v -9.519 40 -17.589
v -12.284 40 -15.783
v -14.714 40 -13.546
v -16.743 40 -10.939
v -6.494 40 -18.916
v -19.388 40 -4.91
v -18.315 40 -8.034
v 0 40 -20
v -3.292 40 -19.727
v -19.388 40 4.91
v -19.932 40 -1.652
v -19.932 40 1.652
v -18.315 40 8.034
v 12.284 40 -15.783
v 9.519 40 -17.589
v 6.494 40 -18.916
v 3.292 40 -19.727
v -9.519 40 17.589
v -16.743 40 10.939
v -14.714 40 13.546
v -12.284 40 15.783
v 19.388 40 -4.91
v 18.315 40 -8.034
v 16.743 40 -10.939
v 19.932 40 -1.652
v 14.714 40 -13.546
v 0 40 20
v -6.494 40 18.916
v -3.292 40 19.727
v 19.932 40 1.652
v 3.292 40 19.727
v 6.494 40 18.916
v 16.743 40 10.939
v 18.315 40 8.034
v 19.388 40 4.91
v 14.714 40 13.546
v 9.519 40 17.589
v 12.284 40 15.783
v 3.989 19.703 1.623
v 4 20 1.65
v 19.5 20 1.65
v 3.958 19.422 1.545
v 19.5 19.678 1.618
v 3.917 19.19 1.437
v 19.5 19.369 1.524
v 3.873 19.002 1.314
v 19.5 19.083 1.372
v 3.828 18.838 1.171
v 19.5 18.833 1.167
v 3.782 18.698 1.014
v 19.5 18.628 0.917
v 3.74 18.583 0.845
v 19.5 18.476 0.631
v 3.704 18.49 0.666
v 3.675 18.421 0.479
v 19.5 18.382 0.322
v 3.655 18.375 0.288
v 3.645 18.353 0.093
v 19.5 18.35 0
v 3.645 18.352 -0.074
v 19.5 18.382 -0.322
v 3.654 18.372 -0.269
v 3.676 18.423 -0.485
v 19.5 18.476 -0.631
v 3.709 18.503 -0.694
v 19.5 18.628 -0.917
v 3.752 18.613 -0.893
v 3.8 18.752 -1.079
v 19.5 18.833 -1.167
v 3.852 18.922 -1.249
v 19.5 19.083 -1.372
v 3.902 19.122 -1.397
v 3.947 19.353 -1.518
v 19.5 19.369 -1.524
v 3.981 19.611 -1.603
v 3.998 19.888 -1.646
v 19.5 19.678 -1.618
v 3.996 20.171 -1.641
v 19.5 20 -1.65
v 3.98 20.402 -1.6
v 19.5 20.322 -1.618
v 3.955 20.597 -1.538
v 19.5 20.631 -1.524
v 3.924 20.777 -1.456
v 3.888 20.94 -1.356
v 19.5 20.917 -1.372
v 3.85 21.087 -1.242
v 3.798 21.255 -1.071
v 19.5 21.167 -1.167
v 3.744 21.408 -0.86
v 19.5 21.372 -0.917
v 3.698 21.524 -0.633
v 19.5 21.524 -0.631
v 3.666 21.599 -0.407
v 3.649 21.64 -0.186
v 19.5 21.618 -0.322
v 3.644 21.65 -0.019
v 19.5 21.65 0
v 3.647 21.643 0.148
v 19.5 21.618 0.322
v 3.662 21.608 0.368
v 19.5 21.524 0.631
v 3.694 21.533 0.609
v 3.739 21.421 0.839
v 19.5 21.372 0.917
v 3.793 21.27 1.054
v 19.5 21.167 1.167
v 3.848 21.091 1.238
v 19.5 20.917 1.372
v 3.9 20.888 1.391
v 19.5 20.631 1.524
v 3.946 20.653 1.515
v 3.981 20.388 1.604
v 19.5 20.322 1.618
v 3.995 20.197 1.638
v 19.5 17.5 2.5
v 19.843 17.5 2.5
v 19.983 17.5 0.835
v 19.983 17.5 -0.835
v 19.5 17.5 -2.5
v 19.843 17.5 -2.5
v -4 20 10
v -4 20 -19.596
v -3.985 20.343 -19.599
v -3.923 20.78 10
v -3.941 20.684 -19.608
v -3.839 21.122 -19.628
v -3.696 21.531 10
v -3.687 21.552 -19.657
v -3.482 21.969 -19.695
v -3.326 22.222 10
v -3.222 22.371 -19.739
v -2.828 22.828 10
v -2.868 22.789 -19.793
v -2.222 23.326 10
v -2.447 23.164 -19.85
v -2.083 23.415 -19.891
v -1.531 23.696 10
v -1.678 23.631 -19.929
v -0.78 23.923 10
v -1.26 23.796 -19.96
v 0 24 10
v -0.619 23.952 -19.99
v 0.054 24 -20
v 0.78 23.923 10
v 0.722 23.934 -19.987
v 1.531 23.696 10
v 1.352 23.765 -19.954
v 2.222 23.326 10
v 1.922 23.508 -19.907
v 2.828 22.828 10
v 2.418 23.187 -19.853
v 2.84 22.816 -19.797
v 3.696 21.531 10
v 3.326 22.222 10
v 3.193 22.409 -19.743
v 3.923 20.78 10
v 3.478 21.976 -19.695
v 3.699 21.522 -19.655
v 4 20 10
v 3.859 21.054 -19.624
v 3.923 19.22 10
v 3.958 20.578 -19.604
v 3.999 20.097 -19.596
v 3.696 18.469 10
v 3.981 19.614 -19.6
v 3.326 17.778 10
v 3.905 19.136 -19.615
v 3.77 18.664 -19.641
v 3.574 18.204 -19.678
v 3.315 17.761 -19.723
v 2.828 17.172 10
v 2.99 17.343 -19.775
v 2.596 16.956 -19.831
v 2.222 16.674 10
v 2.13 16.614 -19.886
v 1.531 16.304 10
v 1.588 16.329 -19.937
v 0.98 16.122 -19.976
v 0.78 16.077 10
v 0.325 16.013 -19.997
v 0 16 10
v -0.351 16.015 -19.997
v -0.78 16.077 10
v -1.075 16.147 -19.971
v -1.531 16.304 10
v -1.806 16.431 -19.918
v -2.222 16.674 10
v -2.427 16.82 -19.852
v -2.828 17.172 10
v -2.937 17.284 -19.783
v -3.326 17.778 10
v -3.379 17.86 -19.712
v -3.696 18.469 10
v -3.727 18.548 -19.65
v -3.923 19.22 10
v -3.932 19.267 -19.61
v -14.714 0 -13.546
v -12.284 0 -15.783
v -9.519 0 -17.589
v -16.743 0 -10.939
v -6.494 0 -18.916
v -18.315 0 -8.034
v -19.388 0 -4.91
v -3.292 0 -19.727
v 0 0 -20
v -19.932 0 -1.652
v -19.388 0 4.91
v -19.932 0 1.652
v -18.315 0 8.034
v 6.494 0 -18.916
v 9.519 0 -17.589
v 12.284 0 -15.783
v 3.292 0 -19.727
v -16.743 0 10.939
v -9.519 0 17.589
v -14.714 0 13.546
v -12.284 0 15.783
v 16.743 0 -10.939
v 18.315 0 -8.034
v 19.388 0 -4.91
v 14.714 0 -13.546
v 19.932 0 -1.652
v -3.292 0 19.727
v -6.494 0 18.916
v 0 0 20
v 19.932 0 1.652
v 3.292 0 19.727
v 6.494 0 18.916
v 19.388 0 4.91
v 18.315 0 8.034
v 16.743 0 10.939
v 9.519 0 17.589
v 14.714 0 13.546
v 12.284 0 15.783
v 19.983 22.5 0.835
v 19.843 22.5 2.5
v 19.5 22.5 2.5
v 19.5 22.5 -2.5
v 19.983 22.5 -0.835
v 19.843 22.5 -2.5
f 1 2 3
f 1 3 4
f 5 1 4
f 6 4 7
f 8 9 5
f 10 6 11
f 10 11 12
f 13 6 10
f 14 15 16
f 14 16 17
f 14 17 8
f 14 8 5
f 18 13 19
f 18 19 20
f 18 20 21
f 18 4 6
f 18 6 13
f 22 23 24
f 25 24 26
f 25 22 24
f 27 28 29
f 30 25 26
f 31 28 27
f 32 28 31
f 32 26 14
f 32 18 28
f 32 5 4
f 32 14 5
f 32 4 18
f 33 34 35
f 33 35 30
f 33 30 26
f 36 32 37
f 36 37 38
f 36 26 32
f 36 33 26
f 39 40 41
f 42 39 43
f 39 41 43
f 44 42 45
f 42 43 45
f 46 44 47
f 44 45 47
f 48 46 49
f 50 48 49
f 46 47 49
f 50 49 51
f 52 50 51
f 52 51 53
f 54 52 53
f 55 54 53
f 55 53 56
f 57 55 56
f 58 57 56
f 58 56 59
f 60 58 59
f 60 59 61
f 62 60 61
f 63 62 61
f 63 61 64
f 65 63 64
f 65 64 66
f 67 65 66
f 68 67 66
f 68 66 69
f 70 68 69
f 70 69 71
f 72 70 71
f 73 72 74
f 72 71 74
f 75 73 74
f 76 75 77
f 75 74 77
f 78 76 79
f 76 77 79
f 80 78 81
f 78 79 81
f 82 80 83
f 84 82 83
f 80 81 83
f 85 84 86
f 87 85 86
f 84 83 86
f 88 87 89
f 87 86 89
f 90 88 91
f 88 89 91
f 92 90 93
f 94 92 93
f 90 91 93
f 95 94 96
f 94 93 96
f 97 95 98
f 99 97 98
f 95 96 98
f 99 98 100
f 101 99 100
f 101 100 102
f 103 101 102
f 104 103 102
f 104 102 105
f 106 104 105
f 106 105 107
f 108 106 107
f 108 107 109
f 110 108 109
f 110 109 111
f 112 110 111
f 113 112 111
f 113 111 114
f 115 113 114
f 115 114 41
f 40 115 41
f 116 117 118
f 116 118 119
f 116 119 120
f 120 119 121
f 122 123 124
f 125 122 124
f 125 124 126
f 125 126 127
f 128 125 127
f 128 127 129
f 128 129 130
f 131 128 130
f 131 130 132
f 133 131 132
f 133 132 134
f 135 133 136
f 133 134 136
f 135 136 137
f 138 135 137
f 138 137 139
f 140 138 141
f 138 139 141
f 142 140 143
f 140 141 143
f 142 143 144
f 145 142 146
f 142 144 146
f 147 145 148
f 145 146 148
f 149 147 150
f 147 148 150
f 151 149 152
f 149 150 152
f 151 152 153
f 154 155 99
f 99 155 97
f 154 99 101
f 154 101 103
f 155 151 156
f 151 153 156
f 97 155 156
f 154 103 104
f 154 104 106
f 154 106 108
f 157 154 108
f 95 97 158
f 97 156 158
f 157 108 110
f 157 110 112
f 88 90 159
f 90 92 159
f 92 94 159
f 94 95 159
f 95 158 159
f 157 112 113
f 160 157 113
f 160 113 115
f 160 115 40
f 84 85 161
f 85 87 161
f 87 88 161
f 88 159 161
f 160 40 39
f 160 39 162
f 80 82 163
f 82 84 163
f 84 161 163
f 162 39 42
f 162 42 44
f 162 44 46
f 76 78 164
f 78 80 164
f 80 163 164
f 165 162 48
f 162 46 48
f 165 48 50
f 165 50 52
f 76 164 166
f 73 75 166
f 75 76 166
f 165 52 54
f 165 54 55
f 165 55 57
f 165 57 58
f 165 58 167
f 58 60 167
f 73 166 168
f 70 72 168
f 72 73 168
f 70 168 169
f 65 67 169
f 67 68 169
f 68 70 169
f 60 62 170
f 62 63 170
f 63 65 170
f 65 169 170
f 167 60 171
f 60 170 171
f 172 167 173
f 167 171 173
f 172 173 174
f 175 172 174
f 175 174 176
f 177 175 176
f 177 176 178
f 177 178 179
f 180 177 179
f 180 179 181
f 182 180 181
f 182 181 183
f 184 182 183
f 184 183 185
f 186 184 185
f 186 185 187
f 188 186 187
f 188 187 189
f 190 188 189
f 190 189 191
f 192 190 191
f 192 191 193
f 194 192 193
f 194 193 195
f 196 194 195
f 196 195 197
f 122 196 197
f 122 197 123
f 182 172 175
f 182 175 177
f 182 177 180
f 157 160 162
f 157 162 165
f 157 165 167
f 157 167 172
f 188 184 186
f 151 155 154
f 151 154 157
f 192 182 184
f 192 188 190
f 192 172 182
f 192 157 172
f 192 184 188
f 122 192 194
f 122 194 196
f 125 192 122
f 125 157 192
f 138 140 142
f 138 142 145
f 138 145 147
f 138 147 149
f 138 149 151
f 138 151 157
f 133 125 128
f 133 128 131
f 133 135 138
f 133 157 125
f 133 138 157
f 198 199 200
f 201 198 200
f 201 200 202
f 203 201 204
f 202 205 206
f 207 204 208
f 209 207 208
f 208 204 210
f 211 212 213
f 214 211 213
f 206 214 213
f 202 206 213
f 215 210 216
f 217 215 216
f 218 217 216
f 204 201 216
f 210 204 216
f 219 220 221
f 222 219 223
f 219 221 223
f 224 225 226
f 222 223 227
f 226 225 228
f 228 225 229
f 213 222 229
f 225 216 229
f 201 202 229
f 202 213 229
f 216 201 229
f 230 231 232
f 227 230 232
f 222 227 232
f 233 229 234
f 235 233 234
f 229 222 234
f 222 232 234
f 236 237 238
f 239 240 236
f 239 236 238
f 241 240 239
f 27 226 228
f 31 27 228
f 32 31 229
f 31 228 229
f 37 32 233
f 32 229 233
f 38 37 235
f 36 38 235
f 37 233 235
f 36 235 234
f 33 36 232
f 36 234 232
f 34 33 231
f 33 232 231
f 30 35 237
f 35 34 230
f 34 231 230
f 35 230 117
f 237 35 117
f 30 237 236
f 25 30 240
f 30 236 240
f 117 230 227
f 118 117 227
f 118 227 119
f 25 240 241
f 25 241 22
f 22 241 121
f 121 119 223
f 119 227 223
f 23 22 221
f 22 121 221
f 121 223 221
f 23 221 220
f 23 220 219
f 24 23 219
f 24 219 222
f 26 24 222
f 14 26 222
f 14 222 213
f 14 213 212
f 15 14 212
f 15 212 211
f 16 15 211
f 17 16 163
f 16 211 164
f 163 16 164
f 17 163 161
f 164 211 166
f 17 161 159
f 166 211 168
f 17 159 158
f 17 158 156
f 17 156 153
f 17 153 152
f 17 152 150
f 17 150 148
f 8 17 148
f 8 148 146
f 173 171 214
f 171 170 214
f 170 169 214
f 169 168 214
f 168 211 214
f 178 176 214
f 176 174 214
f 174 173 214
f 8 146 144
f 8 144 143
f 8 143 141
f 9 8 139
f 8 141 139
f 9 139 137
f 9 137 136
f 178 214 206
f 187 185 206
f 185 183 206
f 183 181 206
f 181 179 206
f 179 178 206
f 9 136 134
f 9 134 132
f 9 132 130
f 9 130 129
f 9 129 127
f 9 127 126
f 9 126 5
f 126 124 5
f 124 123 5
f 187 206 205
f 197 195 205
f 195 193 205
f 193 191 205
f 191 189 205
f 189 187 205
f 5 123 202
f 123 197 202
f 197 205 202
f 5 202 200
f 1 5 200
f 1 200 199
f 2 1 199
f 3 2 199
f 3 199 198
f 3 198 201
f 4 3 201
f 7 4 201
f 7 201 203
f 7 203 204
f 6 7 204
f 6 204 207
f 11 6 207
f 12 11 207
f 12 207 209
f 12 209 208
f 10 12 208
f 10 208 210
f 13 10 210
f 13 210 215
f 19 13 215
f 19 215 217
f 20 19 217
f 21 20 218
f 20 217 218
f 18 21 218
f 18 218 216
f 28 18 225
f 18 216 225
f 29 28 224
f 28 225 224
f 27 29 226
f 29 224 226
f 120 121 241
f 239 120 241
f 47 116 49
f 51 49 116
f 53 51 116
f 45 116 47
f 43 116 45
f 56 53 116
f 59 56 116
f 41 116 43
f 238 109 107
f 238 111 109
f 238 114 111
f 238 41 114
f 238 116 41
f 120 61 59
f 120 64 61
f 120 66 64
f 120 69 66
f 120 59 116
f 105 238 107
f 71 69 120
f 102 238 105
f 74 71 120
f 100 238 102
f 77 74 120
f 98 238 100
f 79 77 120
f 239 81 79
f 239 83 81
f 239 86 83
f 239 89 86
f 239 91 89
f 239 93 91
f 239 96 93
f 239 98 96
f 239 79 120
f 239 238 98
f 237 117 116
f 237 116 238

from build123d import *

# Parameters (mm, degrees)
SKETCH1_R                  = 20
BOSS_EXTRUDE1_DEPTH        = 40
SKETCH3_R                  = 4
CUT_EXTRUDE1_DEPTH         = 30
M4X0_7_TAPPED_HOLE1_REACH  = 50.99
M4X0_7_TAPPED_HOLE1_BORE_R = 1.65
SKETCH4_W                  = 5
SKETCH4_H                  = 5
CUT_EXTRUDE2_DEPTH         = 0.5


with BuildPart() as part:
    # Sketch1 → Boss-Extrude1 (new body)
    with BuildSketch(Plane(origin=(0, 0, 0), x_dir=(1, 0, 0), z_dir=(0, 1, 0))):
        with Locations(Location((0, 0, 0), (0, 0, 270))):
            Circle(SKETCH1_R)
    extrude(amount=BOSS_EXTRUDE1_DEPTH)

    # Sketch3 → Cut-Extrude1 (cut)
    with BuildSketch(Plane(origin=(0, 0, -20), x_dir=(-1, 0, 0), z_dir=(0, 0, -1))):
        with Locations((0, 20)):
            Circle(SKETCH3_R)
    extrude(amount=-CUT_EXTRUDE1_DEPTH, mode=Mode.SUBTRACT)

    # M4x0.7 Tapped Hole1 bore (on position points) → M4x0.7 Tapped Hole1 (cut, up to next)
    with BuildSketch(Plane(origin=(20, 20, 0), x_dir=(0, 0, 1), z_dir=(1, 0, 0)), mode=Mode.PRIVATE) as m4x0_7_tapped_hole1_sk1:
        Circle(M4X0_7_TAPPED_HOLE1_BORE_R)
    m4x0_7_tapped_hole1_tool1 = extrude(m4x0_7_tapped_hole1_sk1.sketch, amount=-M4X0_7_TAPPED_HOLE1_REACH, mode=Mode.PRIVATE) & part.part
    add(m4x0_7_tapped_hole1_tool1.solids().sort_by_distance((20, 20, 0))[0], mode=Mode.SUBTRACT)

    # Sketch4 → Cut-Extrude2 (cut)
    with BuildSketch(Plane(origin=(20, 0, 0), x_dir=(0, 0, -1), z_dir=(1, 0, 0))):
        with Locations((0, 20)):
            Rectangle(SKETCH4_W, SKETCH4_H)
    extrude(amount=-CUT_EXTRUDE2_DEPTH, mode=Mode.SUBTRACT)


solid = part.part
